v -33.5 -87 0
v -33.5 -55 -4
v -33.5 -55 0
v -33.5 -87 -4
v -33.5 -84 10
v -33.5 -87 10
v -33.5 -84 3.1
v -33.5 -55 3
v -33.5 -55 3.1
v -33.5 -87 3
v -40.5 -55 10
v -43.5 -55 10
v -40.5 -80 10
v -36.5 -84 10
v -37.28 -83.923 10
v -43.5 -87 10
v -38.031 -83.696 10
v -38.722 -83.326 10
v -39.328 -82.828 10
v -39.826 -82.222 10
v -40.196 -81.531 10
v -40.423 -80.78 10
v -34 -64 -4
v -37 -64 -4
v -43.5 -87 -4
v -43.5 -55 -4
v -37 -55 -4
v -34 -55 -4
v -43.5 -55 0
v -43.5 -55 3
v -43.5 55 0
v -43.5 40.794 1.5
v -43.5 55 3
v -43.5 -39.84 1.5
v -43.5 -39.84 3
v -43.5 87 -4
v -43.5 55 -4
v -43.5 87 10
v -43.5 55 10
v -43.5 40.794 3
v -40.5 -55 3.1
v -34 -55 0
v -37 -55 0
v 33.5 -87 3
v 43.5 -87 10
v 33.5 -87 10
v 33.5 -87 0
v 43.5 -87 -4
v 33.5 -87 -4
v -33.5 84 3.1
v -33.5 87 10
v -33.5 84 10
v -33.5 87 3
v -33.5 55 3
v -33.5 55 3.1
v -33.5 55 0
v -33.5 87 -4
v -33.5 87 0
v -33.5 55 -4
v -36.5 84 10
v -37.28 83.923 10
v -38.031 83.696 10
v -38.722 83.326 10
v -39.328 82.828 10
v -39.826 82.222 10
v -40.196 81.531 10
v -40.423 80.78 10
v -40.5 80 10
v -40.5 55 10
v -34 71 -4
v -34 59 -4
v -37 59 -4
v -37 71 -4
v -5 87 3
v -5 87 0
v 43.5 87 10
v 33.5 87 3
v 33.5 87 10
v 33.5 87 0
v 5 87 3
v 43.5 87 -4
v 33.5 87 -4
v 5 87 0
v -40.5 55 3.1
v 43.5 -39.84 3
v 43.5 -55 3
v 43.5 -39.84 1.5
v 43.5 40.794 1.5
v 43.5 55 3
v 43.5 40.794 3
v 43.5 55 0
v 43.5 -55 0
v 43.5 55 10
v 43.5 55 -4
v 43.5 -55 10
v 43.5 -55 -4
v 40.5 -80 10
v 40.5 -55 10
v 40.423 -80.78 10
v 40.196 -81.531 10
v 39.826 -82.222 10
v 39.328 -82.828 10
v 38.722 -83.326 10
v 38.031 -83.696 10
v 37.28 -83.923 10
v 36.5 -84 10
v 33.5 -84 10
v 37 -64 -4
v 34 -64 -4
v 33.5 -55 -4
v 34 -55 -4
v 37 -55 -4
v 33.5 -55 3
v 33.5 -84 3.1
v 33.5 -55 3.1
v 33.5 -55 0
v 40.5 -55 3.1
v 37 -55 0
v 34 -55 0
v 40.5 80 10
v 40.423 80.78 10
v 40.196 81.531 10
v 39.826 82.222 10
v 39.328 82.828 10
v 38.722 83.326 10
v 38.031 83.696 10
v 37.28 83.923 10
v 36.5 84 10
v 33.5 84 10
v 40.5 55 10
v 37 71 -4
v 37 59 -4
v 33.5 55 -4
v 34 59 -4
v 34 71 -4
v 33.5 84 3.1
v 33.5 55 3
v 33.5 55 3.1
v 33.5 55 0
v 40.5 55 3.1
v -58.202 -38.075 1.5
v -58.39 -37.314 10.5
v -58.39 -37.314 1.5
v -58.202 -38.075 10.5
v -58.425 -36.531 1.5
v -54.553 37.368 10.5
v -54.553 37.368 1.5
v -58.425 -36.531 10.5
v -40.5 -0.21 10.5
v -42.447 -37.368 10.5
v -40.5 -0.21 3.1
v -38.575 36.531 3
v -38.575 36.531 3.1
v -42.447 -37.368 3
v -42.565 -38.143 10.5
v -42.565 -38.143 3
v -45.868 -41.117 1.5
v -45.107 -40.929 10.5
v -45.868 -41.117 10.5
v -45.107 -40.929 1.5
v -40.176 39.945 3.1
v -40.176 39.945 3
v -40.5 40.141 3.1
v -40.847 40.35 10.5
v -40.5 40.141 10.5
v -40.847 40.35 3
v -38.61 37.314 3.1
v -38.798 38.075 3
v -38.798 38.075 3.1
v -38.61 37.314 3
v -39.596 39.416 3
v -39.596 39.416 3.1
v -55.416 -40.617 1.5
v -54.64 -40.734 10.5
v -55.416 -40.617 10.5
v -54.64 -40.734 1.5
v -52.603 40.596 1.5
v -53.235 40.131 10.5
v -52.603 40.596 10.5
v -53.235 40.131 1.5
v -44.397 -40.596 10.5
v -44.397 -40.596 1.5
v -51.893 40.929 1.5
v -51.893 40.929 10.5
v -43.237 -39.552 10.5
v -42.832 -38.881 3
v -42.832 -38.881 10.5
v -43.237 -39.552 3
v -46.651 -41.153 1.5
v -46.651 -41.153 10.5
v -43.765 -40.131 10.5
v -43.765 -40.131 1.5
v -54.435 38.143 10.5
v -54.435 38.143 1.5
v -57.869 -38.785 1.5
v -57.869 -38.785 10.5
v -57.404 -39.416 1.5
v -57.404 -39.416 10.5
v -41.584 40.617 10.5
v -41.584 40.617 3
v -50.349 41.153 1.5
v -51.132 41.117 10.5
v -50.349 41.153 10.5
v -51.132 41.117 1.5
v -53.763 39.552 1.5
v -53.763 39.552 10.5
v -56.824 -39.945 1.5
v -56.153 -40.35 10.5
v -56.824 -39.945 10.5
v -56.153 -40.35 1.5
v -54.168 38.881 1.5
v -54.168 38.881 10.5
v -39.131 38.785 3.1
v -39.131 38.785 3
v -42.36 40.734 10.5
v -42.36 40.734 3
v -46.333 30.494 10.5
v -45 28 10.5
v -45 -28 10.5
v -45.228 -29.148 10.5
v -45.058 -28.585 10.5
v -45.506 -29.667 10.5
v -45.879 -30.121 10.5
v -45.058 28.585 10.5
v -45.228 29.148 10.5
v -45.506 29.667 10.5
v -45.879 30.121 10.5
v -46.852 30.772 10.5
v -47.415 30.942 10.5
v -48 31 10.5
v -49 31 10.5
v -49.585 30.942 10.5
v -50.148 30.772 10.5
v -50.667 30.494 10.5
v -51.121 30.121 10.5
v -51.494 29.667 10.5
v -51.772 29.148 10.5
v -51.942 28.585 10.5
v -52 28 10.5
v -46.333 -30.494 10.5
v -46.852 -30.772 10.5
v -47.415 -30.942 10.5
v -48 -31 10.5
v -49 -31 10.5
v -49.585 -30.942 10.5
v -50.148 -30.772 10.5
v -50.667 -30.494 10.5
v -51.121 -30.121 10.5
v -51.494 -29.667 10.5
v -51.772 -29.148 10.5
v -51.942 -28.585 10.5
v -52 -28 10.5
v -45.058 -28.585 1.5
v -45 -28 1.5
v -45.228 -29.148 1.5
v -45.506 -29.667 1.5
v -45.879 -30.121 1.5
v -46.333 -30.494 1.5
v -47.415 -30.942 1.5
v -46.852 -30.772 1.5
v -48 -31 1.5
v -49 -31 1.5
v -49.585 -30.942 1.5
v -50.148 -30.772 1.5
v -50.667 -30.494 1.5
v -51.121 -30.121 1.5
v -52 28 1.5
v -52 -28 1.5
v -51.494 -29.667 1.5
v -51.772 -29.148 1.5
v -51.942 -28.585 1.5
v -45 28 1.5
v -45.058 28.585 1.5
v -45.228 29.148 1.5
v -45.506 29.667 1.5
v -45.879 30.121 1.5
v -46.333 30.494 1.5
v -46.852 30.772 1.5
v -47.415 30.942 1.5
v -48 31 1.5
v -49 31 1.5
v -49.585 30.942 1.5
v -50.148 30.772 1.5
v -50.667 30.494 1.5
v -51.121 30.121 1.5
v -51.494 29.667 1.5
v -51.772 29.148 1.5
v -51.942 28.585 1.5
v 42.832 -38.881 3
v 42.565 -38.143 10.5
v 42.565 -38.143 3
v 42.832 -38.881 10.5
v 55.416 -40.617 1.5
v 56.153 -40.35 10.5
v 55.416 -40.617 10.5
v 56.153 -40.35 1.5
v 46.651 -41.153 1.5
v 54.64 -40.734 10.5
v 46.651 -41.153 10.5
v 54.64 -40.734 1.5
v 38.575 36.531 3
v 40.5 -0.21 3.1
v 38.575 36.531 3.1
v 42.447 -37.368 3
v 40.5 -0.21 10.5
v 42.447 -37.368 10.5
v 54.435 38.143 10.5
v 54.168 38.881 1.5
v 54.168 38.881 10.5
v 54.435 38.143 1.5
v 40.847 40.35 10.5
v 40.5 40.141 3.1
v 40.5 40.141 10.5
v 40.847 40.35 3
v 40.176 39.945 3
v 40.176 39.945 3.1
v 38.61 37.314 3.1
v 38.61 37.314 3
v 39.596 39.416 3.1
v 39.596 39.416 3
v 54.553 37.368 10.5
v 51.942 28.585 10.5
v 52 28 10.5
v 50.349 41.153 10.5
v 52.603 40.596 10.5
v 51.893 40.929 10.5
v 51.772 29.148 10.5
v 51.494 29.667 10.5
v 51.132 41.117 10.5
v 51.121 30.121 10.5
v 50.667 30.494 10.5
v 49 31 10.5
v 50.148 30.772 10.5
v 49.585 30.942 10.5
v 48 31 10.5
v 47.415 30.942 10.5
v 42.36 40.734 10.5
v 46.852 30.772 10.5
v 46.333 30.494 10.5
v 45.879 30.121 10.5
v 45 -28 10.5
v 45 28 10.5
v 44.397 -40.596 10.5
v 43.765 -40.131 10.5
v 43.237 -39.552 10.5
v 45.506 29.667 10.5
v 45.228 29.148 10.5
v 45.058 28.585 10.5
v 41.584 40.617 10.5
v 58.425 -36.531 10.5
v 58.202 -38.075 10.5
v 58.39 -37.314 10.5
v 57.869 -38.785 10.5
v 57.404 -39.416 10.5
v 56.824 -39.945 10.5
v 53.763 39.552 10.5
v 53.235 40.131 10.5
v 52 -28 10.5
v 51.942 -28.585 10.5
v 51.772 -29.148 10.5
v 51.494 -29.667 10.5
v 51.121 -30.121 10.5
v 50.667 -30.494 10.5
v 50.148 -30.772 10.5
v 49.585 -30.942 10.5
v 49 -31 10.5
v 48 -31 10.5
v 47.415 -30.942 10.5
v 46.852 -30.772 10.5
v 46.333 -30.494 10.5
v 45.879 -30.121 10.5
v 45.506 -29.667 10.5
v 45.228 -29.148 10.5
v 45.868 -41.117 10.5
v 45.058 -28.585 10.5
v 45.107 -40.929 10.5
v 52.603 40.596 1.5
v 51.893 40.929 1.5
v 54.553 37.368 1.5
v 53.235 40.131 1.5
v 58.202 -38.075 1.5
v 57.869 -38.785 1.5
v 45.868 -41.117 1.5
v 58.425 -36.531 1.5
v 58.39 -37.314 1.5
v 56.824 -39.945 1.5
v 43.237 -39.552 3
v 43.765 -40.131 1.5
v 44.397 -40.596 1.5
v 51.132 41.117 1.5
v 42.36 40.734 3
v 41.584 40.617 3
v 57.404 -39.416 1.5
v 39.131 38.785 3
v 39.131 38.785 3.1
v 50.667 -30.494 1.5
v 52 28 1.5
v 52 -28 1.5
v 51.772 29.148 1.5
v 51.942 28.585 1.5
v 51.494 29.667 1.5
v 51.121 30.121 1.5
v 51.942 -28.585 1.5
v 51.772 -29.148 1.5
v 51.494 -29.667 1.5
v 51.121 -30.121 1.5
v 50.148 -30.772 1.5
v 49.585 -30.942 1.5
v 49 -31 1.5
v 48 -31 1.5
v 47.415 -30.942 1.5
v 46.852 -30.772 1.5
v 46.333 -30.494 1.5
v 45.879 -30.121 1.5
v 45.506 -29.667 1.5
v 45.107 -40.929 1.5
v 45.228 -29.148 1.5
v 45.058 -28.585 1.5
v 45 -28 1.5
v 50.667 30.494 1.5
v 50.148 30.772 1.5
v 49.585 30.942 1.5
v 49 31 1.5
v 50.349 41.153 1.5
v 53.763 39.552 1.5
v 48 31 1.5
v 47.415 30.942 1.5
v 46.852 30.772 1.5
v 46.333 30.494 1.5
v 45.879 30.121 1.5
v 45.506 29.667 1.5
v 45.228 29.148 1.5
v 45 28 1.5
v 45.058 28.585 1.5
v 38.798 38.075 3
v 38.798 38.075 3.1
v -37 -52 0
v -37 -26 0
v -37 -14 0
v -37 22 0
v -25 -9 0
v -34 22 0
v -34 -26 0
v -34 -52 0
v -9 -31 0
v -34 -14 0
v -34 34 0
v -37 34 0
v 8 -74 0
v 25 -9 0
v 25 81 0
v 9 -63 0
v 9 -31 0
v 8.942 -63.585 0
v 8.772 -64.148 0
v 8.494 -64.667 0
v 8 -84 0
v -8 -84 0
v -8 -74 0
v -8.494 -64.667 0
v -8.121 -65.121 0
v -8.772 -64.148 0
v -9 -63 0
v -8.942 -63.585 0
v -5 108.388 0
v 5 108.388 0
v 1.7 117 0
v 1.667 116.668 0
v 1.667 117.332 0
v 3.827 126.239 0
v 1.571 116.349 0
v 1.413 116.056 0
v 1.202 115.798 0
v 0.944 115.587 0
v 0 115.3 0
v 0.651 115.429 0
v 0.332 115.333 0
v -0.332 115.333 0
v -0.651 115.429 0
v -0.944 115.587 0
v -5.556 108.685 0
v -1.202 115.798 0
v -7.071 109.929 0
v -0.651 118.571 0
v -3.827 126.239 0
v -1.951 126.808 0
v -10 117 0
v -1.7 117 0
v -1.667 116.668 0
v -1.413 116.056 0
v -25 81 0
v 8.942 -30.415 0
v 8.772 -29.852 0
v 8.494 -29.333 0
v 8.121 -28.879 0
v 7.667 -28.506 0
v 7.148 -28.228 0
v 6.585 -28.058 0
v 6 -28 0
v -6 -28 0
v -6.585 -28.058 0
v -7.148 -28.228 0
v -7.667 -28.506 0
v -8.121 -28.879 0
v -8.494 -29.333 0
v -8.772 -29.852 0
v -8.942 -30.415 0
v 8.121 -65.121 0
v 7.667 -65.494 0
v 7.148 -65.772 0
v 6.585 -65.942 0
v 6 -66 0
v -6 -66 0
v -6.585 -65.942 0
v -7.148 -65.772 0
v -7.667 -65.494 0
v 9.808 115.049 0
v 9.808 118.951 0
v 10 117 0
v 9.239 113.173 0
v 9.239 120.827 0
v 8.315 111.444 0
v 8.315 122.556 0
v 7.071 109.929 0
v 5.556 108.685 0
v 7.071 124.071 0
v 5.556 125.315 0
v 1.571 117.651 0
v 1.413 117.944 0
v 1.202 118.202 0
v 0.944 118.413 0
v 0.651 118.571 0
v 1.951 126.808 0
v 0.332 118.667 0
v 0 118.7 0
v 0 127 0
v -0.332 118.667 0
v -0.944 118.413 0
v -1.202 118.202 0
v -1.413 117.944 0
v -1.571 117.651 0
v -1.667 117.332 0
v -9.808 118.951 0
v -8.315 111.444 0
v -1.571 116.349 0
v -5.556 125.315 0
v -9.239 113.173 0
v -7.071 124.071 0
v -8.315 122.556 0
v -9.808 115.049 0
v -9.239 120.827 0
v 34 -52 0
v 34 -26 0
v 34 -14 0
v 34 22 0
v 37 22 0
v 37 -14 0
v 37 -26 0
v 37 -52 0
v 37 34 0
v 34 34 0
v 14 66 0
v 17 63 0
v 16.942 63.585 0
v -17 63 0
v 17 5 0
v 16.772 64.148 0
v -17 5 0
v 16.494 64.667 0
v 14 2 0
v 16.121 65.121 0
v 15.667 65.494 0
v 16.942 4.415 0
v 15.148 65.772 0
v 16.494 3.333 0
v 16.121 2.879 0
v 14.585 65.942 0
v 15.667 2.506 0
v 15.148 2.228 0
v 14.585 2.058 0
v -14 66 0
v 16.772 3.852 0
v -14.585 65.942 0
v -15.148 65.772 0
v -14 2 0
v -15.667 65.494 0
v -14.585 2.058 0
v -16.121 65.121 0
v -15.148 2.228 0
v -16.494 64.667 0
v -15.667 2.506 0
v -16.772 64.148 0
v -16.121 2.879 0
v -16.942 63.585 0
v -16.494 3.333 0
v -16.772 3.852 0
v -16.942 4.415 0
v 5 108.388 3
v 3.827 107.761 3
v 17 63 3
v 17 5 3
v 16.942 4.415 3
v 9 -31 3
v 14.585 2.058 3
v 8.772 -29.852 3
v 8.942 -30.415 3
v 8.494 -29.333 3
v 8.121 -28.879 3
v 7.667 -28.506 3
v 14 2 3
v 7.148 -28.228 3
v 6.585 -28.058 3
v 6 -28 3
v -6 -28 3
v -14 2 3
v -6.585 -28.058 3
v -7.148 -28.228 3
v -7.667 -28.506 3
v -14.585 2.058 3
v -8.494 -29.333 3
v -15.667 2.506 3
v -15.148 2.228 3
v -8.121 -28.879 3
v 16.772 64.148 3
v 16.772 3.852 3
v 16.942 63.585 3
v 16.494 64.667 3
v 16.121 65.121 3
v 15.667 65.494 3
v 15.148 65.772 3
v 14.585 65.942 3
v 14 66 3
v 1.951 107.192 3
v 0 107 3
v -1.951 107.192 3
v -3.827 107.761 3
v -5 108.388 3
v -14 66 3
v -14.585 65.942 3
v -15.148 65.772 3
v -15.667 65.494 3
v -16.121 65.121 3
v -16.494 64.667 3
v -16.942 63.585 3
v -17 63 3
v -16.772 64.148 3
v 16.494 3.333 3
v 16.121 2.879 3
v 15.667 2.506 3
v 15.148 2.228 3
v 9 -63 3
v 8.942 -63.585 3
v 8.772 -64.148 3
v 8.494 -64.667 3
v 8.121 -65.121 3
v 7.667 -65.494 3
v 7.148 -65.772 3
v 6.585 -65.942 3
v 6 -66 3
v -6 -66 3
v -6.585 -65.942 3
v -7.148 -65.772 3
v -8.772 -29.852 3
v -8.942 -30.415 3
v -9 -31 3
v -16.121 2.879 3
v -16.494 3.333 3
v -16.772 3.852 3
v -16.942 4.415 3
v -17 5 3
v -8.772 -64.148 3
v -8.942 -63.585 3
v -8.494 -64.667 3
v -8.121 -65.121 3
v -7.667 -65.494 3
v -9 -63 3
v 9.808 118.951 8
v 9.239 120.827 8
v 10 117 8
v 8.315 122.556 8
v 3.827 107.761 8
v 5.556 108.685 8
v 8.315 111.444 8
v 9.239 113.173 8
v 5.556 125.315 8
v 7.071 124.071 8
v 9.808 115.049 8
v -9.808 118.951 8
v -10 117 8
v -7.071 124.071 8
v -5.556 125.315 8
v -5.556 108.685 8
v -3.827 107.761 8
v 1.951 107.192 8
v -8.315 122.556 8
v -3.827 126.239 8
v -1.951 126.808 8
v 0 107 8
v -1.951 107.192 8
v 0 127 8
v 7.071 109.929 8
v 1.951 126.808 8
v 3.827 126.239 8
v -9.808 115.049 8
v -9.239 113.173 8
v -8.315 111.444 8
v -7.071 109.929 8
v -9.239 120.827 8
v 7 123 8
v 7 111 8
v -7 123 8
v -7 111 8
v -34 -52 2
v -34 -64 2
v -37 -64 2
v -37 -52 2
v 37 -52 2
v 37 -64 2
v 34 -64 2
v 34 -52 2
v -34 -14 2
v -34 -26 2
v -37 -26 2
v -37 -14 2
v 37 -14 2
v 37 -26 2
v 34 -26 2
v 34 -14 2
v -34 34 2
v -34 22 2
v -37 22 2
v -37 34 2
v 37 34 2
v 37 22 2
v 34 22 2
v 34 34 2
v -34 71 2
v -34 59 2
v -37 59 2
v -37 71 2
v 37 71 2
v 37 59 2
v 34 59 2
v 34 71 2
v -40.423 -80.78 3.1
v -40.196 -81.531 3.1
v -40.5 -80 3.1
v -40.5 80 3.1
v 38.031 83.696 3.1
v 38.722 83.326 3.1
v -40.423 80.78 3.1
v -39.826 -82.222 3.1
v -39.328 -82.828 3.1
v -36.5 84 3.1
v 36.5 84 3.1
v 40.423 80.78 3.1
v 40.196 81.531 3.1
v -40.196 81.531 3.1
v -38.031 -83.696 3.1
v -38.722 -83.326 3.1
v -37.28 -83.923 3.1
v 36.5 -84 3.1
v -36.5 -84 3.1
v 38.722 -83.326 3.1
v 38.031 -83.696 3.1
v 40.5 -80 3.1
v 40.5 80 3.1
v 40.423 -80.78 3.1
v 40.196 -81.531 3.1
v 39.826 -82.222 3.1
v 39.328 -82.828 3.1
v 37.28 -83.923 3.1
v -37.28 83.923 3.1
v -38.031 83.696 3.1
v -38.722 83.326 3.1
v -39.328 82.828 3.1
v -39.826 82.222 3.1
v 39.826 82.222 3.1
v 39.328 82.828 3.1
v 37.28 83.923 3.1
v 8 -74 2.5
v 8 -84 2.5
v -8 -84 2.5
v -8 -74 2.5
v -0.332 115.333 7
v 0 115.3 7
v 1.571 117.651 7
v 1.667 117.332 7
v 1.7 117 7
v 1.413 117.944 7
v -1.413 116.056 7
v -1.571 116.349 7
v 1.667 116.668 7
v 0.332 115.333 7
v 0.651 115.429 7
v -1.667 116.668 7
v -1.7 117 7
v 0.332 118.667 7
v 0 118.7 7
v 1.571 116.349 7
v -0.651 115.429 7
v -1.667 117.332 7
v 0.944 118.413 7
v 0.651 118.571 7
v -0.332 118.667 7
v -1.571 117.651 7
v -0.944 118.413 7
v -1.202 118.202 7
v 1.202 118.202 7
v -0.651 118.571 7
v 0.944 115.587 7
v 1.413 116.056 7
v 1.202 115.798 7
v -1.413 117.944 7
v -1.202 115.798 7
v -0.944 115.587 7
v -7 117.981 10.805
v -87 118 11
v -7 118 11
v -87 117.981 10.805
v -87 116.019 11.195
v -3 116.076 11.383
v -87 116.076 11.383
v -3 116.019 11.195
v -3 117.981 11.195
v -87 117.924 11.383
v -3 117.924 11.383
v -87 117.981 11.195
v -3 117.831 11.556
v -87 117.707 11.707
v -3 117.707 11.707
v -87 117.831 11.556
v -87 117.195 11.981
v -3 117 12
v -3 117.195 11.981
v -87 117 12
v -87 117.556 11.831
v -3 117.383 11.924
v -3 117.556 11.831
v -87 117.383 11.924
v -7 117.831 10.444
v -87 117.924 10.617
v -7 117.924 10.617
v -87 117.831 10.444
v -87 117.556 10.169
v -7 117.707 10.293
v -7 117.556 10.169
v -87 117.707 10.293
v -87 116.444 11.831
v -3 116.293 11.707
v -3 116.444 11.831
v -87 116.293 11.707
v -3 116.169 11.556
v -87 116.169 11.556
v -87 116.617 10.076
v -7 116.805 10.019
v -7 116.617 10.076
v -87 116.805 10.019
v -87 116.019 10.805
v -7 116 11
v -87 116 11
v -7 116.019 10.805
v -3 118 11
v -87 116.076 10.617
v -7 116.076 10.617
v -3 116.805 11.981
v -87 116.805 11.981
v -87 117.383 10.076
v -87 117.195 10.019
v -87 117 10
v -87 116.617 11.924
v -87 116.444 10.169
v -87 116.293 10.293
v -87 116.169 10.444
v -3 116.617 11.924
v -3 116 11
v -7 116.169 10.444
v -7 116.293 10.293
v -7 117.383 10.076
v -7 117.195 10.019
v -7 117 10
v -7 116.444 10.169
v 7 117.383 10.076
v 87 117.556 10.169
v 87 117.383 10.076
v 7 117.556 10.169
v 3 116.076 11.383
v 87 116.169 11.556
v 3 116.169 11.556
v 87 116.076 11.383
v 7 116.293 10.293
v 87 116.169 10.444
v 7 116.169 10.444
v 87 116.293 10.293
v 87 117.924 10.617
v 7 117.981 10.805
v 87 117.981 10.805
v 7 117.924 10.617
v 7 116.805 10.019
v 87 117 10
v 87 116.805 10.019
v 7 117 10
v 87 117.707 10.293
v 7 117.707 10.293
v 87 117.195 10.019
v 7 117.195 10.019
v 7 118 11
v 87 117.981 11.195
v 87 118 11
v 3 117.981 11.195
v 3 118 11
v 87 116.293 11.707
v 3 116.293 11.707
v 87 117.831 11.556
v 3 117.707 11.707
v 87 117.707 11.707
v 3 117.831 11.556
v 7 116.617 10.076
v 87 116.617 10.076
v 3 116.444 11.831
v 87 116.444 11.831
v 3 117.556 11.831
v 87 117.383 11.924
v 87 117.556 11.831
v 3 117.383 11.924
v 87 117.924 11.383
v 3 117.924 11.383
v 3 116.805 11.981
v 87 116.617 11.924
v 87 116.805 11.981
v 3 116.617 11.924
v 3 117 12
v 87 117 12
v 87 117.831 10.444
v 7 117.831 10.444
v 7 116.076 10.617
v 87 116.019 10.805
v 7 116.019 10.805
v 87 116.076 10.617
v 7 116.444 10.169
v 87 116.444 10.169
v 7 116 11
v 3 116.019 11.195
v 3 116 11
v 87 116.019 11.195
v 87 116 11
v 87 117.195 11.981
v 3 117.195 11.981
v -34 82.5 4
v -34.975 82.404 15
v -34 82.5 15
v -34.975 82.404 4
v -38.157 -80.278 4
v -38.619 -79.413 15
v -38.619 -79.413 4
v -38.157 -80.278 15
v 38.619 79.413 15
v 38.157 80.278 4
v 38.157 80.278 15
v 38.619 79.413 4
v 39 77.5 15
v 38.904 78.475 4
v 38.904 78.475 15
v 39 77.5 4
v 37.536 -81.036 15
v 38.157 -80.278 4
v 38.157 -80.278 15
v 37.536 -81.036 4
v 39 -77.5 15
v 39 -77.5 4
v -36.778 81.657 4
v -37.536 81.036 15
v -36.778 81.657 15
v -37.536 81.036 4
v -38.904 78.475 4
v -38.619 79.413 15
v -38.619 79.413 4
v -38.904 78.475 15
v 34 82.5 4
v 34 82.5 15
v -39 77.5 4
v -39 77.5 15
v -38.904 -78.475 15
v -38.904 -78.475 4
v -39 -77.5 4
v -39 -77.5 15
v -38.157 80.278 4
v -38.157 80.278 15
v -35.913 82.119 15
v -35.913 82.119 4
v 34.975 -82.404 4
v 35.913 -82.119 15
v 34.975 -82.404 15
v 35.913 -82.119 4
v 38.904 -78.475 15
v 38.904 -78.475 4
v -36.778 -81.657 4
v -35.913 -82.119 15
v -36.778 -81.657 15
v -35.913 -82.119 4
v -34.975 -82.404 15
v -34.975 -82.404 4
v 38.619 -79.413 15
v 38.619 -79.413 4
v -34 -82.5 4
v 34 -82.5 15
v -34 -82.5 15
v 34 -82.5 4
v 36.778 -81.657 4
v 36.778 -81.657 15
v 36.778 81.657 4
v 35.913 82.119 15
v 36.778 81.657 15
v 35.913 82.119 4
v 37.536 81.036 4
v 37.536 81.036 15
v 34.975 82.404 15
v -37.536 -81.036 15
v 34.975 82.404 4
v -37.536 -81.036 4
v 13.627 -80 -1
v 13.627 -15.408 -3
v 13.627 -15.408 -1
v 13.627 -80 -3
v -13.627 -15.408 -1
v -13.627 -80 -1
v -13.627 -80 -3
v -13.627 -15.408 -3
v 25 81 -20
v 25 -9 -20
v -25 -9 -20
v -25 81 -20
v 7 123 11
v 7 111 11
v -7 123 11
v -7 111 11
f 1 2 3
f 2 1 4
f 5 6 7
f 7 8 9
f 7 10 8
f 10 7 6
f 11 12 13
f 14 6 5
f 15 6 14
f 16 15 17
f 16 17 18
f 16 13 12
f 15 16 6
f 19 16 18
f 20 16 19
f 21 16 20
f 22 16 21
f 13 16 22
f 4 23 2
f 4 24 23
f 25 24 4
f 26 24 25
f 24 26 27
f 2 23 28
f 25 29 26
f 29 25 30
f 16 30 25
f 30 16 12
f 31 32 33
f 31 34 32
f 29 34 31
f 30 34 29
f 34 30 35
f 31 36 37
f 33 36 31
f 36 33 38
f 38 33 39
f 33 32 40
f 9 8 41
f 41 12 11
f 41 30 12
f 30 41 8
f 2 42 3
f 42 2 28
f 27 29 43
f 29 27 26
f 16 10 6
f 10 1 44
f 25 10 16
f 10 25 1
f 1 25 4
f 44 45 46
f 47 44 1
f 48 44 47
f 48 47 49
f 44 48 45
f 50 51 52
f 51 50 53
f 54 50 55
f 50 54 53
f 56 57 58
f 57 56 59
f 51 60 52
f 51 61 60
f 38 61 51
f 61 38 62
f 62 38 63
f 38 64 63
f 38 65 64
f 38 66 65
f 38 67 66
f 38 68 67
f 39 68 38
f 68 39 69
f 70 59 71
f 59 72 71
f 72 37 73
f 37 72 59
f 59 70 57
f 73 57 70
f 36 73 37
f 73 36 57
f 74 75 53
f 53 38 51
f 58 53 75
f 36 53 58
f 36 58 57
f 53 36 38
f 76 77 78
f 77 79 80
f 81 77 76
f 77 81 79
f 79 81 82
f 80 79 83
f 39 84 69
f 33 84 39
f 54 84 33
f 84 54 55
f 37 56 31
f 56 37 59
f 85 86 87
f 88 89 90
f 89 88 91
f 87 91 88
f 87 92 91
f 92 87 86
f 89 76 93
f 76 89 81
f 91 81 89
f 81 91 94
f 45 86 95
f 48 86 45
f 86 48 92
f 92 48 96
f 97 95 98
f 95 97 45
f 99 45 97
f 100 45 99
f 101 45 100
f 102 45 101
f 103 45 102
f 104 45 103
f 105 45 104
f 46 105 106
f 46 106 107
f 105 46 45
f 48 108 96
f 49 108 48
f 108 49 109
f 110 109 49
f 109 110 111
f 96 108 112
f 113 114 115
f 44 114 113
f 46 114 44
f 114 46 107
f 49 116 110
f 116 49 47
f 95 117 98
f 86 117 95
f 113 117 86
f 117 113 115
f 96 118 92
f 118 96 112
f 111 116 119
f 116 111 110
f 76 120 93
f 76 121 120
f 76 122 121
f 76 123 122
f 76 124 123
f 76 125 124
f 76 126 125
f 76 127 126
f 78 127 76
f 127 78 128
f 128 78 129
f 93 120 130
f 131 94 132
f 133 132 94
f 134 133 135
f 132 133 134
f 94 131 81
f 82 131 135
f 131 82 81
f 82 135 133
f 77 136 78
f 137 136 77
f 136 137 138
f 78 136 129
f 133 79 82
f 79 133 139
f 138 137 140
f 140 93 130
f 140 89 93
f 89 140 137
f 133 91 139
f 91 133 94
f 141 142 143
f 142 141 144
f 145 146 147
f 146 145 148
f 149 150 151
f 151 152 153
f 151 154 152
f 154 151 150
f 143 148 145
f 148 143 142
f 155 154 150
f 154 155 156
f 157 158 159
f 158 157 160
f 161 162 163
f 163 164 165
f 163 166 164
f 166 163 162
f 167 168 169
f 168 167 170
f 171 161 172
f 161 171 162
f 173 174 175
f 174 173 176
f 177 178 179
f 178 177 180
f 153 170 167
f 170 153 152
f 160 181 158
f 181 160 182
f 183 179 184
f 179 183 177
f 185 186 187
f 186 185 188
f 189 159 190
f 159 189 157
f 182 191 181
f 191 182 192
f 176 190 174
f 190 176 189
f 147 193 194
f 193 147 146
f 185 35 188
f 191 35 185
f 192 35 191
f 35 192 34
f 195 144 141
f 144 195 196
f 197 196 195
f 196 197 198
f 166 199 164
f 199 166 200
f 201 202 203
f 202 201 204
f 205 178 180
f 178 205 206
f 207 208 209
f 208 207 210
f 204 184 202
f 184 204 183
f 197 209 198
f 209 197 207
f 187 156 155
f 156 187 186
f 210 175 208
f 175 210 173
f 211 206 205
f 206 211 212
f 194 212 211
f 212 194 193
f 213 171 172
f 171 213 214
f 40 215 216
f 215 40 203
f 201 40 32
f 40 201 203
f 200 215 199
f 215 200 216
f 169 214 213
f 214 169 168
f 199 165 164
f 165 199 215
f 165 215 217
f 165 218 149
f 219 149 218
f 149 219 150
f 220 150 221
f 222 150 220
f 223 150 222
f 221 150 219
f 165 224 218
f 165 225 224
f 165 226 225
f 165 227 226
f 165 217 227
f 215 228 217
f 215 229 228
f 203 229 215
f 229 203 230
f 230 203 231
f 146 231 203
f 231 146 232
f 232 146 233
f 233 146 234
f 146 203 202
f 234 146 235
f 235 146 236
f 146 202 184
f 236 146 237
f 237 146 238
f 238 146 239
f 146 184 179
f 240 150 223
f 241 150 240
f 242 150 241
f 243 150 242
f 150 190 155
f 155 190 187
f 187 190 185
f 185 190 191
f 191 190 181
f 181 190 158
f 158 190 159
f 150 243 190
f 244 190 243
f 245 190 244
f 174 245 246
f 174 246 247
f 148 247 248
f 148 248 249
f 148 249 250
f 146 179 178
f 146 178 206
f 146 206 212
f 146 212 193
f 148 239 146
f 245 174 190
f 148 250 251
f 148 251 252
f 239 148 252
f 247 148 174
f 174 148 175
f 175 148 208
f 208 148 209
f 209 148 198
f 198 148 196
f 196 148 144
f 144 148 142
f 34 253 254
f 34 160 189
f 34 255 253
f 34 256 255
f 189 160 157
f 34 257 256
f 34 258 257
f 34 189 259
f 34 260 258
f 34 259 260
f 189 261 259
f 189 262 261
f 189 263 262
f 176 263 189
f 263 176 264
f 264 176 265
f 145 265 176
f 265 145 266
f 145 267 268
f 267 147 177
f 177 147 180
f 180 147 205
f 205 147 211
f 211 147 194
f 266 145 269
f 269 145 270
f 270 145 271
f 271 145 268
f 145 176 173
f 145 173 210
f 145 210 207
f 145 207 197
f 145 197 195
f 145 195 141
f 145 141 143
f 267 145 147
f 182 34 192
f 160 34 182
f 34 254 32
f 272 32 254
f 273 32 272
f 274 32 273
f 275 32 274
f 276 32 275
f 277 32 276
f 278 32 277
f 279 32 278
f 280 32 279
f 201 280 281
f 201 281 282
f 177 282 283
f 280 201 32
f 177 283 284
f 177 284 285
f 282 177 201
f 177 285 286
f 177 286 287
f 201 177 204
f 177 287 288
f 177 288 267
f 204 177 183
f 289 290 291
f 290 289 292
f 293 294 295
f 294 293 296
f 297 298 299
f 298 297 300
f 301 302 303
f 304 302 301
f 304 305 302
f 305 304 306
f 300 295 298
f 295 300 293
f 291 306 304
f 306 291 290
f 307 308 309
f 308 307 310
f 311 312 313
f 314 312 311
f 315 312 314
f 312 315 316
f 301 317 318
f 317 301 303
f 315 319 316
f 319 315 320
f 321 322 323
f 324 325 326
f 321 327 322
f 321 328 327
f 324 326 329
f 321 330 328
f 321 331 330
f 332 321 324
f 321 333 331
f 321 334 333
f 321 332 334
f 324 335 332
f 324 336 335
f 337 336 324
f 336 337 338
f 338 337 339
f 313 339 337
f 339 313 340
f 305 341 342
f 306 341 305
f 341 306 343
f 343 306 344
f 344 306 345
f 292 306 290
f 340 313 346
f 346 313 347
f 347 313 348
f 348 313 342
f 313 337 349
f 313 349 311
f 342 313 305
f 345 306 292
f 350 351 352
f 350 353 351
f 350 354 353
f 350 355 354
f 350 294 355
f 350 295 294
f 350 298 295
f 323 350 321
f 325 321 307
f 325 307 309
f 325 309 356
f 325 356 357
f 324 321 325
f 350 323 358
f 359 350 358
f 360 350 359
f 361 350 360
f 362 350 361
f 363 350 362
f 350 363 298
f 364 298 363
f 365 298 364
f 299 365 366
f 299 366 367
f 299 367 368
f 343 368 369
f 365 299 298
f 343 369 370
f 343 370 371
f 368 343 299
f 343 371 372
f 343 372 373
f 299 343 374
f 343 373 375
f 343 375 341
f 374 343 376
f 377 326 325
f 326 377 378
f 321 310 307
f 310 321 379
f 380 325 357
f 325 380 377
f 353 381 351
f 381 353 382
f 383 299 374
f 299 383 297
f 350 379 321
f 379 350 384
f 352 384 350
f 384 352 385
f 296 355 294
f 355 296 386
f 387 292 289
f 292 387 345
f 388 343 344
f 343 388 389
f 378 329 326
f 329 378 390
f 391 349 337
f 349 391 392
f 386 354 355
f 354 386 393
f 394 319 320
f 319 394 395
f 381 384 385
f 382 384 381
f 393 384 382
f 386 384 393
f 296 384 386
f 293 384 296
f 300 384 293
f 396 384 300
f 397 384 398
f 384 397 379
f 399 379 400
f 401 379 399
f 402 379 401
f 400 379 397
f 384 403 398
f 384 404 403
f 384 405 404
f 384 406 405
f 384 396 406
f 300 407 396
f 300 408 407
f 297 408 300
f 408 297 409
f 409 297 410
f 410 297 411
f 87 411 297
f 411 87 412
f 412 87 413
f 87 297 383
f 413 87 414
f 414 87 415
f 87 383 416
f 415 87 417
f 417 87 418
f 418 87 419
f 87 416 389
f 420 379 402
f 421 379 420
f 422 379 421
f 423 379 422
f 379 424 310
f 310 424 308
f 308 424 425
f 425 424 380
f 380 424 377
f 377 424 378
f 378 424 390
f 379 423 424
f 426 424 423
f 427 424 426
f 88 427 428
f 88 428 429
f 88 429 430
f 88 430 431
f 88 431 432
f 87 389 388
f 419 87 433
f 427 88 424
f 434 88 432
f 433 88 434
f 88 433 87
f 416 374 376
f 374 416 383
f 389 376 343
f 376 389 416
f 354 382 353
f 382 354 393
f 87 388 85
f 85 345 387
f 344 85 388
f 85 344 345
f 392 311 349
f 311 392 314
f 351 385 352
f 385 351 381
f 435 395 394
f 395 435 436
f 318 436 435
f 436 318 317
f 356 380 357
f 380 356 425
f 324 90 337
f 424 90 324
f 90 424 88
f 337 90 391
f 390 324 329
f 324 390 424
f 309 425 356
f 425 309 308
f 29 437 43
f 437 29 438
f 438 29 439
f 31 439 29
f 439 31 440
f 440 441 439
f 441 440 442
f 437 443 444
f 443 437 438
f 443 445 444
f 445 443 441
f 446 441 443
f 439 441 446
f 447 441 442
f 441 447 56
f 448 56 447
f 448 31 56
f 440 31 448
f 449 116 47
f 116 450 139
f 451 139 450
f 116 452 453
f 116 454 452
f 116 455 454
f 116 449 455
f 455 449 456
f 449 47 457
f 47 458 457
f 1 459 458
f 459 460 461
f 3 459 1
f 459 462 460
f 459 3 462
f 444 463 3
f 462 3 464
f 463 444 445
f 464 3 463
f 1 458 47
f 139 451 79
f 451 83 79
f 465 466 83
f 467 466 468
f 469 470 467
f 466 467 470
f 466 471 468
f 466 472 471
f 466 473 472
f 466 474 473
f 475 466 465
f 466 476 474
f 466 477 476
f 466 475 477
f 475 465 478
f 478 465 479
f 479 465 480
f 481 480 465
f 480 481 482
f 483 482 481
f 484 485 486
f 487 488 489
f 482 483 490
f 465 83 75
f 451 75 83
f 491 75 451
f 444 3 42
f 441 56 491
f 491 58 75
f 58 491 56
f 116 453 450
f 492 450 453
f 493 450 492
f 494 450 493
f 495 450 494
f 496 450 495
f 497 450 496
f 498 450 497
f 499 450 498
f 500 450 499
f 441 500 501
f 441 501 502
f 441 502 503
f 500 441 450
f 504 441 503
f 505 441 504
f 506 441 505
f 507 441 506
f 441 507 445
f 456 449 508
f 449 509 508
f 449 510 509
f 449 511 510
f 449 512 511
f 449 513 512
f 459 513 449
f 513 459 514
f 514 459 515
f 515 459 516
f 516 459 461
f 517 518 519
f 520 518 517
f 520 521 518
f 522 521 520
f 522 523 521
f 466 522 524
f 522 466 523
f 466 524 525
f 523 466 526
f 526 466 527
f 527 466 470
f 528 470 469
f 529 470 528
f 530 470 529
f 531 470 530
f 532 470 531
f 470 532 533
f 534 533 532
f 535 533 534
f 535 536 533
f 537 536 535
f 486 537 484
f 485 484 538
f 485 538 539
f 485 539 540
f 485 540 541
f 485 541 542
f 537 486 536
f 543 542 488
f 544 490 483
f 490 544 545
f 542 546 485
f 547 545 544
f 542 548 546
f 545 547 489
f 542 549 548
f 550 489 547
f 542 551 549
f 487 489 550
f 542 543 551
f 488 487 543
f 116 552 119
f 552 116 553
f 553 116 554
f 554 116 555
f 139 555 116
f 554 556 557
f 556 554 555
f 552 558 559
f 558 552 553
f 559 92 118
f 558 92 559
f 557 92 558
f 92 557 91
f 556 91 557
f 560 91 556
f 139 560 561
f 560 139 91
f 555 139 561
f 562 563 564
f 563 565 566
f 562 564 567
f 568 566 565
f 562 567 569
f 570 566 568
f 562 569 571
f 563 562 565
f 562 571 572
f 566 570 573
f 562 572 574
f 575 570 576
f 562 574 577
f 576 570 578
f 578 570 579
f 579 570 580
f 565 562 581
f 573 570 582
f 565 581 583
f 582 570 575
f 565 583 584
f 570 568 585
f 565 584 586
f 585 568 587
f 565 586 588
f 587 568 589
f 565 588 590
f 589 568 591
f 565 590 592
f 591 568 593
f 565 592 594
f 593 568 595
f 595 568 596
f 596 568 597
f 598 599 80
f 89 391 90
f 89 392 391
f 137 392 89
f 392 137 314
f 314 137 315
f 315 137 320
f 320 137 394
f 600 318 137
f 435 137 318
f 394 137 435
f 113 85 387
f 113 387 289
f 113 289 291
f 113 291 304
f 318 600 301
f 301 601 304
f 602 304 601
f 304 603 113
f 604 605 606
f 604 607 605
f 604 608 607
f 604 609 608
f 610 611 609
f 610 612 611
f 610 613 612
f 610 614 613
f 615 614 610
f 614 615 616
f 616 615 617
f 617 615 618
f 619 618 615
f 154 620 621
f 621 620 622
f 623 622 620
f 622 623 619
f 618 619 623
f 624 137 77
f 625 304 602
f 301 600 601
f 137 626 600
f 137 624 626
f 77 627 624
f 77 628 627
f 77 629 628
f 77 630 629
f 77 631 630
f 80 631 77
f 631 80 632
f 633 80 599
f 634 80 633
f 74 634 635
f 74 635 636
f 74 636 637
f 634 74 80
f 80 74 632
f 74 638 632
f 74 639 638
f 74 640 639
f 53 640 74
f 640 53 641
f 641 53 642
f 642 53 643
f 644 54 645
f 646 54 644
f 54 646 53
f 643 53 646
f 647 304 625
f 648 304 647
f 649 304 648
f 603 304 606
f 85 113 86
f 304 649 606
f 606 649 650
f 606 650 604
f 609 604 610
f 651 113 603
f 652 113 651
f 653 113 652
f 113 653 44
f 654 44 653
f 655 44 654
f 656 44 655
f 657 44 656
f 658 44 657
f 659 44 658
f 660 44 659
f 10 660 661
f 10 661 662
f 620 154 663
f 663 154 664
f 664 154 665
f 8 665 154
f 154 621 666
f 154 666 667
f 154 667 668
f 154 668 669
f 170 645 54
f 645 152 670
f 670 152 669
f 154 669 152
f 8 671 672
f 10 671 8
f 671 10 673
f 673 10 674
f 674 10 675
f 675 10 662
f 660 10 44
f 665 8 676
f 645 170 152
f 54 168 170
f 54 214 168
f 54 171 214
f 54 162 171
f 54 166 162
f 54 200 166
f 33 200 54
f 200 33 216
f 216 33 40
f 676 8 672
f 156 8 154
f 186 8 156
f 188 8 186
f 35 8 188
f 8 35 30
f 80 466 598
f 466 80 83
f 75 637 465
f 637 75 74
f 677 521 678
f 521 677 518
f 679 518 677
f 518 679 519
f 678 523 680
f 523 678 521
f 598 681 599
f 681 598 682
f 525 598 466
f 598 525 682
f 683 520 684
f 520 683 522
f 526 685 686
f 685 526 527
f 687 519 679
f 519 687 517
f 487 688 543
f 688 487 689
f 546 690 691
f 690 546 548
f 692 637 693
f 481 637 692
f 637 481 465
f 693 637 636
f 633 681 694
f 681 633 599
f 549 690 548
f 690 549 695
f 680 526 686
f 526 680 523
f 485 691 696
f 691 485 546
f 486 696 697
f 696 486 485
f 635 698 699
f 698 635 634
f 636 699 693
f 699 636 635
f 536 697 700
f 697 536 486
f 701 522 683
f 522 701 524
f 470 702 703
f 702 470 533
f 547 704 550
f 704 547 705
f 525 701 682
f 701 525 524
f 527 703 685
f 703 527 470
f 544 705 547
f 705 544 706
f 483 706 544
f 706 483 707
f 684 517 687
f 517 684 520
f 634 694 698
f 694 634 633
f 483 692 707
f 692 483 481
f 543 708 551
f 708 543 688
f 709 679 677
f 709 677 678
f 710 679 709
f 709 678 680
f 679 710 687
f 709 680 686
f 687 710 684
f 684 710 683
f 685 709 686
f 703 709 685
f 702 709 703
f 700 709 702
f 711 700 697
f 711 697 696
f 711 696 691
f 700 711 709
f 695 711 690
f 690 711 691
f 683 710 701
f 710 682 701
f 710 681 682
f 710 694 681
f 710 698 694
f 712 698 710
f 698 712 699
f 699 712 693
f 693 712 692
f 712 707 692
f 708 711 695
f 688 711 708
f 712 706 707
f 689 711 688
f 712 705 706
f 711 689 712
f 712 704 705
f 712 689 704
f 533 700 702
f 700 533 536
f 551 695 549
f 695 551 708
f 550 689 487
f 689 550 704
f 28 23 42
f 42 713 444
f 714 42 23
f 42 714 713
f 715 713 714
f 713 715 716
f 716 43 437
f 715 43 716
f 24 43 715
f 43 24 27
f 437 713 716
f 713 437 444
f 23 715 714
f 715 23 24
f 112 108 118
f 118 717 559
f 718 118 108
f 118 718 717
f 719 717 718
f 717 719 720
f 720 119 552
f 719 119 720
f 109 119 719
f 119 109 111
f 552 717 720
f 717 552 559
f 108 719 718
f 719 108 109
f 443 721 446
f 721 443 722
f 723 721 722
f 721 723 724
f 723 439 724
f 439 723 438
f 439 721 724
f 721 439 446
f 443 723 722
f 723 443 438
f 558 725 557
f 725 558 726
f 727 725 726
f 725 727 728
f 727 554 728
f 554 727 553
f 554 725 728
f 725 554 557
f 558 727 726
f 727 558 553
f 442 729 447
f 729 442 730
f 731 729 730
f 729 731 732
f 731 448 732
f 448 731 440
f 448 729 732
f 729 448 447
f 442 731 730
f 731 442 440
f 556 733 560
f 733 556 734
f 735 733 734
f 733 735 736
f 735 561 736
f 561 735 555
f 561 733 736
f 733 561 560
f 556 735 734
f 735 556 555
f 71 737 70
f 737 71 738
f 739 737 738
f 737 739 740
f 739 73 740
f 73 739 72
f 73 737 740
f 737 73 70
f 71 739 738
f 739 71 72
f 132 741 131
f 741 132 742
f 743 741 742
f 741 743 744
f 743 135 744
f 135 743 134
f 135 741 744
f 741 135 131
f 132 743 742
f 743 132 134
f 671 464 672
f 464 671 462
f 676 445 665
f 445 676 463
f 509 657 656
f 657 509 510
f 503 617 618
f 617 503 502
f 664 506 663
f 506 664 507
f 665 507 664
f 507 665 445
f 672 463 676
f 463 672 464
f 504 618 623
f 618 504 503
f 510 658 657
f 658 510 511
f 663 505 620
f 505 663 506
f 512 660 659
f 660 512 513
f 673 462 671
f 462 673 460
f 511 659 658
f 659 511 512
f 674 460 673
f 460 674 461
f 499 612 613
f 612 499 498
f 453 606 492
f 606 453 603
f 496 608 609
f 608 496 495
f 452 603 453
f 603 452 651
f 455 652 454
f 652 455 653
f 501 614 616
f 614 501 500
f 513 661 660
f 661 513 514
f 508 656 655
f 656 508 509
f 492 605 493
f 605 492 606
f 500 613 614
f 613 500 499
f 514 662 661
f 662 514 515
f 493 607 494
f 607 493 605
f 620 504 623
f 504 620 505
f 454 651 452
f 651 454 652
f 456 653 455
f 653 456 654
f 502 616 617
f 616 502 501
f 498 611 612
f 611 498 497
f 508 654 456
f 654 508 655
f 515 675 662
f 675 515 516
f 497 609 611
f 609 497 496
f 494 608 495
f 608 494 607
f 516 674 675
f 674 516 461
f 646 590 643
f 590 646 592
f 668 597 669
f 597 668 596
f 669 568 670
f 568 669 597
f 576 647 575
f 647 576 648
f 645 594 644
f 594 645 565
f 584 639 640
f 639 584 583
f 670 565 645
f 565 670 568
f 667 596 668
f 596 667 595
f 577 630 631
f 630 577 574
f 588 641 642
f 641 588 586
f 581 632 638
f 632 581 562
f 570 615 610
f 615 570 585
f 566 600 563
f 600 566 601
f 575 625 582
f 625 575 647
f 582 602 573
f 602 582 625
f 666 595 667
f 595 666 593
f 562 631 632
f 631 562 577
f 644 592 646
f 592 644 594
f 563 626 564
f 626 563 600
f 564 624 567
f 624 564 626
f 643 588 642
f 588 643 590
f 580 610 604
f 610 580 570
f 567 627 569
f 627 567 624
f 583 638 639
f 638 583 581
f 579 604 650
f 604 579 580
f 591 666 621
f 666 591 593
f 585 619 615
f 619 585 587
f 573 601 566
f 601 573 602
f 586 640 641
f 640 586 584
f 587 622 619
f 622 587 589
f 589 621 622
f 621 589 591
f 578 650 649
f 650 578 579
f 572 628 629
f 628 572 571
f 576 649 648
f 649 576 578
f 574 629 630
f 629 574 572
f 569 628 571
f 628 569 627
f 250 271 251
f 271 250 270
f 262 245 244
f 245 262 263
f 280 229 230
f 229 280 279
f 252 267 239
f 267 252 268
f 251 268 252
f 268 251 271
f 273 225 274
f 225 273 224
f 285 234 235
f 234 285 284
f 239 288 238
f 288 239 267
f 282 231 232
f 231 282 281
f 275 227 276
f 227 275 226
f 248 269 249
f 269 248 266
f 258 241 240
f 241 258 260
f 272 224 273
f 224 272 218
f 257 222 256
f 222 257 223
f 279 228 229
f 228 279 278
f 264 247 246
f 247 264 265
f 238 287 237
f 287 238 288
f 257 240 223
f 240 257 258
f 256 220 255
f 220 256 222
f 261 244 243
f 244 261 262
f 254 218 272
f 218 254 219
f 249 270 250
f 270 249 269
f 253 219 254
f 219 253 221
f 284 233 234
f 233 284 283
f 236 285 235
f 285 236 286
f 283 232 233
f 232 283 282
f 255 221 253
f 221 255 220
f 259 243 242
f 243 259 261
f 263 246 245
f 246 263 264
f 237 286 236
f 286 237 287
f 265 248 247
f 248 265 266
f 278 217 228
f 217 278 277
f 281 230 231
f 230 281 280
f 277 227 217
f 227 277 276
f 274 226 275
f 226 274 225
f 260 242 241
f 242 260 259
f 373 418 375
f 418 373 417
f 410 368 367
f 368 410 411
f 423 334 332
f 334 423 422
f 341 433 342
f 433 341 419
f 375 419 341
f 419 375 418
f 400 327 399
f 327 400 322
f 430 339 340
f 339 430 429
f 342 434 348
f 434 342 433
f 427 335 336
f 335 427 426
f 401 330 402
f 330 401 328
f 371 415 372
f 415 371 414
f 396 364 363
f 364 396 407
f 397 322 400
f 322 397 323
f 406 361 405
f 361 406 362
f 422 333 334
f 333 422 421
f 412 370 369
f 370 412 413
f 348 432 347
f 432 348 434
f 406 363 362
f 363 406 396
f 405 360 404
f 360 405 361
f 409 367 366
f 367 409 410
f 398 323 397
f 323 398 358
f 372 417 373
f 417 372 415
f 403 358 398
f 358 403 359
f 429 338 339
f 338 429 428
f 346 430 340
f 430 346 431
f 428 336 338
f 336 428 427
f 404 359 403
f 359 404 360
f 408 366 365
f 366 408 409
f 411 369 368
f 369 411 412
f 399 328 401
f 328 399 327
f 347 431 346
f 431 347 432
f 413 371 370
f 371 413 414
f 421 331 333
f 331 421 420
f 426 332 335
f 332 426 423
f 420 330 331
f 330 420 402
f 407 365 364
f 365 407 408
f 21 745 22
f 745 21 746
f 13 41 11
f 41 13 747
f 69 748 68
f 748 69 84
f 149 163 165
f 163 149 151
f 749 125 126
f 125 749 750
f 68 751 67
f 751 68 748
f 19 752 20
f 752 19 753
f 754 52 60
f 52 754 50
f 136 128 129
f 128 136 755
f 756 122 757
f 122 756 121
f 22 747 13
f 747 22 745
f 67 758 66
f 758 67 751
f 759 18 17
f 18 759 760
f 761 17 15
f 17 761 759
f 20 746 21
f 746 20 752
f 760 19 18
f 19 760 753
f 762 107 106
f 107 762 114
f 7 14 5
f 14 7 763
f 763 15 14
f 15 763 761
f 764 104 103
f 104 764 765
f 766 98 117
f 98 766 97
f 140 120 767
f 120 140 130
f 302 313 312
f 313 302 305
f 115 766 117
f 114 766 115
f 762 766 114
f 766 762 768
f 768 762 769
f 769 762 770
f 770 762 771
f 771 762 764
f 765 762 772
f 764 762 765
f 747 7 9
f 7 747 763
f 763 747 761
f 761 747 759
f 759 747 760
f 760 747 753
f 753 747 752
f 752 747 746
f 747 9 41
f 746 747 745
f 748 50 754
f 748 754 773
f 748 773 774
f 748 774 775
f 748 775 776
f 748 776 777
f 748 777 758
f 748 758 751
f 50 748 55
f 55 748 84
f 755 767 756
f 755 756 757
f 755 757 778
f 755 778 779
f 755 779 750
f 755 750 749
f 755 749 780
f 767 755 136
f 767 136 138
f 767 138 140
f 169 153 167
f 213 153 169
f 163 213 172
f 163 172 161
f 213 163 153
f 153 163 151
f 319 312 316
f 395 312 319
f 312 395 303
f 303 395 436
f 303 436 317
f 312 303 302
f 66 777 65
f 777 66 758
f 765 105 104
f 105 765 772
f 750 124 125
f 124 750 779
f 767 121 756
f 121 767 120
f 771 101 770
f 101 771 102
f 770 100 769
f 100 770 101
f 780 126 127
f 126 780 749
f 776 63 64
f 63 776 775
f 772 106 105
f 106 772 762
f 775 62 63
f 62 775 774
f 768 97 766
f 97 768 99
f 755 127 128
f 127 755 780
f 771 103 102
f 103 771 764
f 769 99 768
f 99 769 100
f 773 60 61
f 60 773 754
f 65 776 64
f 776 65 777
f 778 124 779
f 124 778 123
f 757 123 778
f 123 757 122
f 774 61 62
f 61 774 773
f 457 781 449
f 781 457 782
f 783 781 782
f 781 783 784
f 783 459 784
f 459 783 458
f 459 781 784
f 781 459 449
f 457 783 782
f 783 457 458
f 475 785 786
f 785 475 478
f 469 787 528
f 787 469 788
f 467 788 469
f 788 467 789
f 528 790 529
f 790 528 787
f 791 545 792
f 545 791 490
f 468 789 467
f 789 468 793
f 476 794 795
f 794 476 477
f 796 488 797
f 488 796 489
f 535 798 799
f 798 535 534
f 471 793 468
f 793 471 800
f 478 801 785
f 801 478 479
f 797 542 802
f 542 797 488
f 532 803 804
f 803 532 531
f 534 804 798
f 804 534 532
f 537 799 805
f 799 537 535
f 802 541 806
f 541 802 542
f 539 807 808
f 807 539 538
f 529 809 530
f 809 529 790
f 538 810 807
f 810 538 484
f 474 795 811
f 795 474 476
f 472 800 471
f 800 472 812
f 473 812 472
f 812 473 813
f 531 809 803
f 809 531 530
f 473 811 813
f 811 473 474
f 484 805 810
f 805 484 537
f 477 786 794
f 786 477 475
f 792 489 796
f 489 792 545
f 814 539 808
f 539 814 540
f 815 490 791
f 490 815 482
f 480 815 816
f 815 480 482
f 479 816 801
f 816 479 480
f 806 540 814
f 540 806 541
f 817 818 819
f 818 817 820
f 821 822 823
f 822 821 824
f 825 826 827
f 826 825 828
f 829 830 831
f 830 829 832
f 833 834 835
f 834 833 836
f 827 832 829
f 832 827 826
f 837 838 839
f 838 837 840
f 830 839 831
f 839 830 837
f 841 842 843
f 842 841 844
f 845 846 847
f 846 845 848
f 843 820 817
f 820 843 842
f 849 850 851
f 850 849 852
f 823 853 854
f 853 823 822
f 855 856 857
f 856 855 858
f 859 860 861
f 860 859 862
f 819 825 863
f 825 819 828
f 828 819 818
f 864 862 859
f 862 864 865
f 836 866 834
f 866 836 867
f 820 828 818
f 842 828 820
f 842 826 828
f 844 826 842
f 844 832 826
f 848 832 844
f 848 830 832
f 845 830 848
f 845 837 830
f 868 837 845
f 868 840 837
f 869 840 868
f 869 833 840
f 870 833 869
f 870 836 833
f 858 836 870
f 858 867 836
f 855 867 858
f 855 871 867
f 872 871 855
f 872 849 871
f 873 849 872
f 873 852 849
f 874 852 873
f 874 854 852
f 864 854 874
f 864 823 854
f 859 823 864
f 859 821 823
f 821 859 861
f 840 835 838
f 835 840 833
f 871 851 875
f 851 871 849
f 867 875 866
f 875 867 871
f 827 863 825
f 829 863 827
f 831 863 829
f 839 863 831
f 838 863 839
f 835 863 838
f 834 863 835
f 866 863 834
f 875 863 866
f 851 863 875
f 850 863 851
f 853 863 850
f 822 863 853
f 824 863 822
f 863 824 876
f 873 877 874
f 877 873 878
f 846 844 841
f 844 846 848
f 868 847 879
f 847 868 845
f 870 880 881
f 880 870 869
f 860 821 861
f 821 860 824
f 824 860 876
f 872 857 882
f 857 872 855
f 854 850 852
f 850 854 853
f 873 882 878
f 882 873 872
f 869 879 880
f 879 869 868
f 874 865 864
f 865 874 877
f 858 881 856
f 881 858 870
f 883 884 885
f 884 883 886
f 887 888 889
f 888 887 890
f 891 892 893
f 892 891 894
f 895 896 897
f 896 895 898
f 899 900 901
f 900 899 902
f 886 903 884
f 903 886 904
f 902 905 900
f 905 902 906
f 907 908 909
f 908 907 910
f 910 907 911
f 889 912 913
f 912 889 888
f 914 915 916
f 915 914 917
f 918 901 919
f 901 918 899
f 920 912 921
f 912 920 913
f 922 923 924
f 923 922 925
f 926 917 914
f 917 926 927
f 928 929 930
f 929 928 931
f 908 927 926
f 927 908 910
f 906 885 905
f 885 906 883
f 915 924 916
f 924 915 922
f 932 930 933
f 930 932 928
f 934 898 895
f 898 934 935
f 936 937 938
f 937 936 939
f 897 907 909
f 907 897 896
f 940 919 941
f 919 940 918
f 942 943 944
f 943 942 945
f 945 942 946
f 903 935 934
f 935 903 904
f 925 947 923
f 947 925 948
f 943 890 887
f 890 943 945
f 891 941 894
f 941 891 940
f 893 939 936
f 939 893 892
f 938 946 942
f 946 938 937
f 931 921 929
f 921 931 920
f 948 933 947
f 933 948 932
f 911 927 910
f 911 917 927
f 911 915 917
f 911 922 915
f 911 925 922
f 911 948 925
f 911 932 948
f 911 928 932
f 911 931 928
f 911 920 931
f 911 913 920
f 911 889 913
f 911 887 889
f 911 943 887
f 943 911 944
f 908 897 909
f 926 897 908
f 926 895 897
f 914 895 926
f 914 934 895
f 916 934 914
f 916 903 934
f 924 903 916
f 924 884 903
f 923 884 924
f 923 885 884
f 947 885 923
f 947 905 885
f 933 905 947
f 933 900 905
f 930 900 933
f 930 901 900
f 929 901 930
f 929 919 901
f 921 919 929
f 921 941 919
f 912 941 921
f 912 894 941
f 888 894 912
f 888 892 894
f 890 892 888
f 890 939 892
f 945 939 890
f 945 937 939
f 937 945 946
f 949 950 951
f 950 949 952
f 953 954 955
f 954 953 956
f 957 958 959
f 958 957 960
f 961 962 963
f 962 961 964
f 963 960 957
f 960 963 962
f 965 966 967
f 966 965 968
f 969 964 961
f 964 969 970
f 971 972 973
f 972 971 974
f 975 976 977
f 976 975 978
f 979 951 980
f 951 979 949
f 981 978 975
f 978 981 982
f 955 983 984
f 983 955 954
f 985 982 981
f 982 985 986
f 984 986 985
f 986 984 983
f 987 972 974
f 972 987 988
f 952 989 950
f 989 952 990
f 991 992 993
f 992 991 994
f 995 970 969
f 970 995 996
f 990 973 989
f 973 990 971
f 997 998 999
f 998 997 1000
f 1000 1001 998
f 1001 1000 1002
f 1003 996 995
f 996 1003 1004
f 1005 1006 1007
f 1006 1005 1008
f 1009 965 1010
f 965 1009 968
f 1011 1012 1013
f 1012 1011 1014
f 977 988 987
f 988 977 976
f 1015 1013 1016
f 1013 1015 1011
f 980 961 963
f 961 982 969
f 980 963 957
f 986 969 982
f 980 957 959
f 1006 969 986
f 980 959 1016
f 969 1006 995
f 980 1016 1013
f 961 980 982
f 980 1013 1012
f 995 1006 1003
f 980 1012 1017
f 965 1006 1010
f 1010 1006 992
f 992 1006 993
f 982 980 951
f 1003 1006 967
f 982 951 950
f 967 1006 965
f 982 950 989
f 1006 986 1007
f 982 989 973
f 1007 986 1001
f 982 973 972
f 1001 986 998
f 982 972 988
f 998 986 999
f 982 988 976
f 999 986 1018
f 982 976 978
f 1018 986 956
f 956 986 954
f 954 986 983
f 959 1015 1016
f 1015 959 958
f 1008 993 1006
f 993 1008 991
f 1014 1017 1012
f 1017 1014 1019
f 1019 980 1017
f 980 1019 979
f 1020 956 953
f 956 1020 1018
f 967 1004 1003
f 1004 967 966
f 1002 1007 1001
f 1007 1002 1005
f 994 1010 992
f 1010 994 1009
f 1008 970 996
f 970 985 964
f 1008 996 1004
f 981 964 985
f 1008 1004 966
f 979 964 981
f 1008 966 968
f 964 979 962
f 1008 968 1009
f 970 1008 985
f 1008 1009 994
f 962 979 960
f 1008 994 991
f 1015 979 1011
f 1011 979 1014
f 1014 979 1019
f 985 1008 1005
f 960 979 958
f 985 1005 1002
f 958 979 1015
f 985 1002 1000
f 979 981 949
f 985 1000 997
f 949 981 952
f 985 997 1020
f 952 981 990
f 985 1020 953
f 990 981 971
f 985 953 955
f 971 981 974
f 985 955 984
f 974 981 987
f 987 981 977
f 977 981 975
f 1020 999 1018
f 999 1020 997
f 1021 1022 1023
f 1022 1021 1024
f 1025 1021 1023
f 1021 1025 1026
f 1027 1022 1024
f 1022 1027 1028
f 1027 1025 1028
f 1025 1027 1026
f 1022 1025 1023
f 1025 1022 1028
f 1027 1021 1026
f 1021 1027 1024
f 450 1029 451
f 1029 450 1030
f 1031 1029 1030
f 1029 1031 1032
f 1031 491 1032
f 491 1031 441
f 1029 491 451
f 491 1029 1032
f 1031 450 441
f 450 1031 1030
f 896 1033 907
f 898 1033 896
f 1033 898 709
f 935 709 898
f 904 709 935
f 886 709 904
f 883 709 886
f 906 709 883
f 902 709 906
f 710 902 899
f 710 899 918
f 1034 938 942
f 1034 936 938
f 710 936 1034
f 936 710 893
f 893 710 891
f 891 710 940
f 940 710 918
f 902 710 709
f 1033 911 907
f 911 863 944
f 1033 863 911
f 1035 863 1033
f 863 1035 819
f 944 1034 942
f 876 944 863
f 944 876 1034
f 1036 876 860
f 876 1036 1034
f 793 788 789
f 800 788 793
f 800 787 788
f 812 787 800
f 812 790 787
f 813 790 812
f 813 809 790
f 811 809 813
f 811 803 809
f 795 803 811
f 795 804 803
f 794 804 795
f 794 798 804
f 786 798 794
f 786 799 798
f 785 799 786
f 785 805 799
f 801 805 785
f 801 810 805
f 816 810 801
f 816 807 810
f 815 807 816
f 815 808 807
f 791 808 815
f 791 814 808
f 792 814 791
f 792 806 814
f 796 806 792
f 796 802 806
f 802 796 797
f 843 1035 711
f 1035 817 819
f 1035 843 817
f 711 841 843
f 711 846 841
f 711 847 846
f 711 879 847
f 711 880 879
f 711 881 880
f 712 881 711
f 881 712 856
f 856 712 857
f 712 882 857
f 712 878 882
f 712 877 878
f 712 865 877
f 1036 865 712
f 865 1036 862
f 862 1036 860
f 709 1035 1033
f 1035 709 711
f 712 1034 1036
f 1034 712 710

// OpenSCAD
// AMID radio dock 0.1 — parametric carrier study, millimetres.
// The default phone/powerbank are envelopes, not verified product dimensions.
// Printable carrier: openscad -D show_mockups=false -o carrier.stl phone_carrier.scad
// Fold study: openscad -D antenna_folded=true ...
$fn = 32;
phone_w = 78;
phone_h = 165;
phone_t = 11;
fit_clearance = 1.5;
wall = 3;
board_w = 27.2542;
board_h = 64.5922;
board_clearance = 2;
powerbank_w = 50;
powerbank_h = 90;
powerbank_t = 20;
rod_length = 84;
feed_gap = 6;
antenna_offset = 30;
antenna_folded = false;
show_mockups = true;

inner_w = phone_w + fit_clearance * 2;
inner_h = phone_h + fit_clearance * 2;
outer_w = inner_w + wall * 2;
outer_h = inner_h + wall * 2;

assert(phone_w >= 60 && phone_h >= 140 && phone_t > 0);
assert(board_w + board_clearance * 2 < inner_w);
assert(powerbank_w + 4 < inner_w);
assert(board_h + powerbank_h + 6 < inner_h);

module slab(w,h,t,r=5) {
  linear_extrude(t) hull() for (x=[-w/2+r,w/2-r], y=[-h/2+r,h/2-r])
    translate([x,y]) circle(r=r);
}
module carrier() {
  difference() {
    union() {
      slab(outer_w,outer_h,wall);
      // Four corner retainers; the centre of each phone edge stays accessible.
      for (sx=[-1,1],sy=[-1,1]) translate([sx*(outer_w/2-5),sy*(outer_h/2-16),wall])
        cube([10,32,phone_t+3],center=true);
      // Side grips join the plate; facets are deliberate, not RF elements.
      for (sx=[-1,1]) translate([sx*(outer_w/2+5),0,wall/2])
        rotate([0,0,sx*3]) slab(16,82,wall+6,4);
      // Dielectric antenna support extends clear of the phone envelope.
      translate([-5,outer_h/2-5,0]) cube([10,antenna_offset+10,wall]);
      translate([0,outer_h/2+antenna_offset,0]) cylinder(h=wall+5,r=10);
    }
    // Phone insertion pocket; retainers intentionally do not clamp glass.
    translate([0,0,wall+.1]) slab(inner_w,inner_h,phone_t+14,4);
    // Retention straps, separate from PCB traces / mounting-hole assumptions.
    for (y=[-58,-20,28,65],x=[-inner_w/2+5,inner_w/2-5])
      translate([x,y,-1]) cube([3,12,wall+3],center=true);
    // Open-back windows and hollow grips reduce printed mass and retain air gaps.
    for (p=[[0,-47,18,38],[0,34,34,64]]) translate([p[0],p[1],-8]) slab(p[2],p[3],wall+18,3);
    for (sx=[-1,1]) translate([sx*(outer_w/2+5),0,-8]) slab(7,62,wall+24,3);
    // Cable/antenna holes are generous pass-throughs, not connector fixtures.
    translate([0,-outer_h/2+8,-1]) cube([16,10,wall+4],center=true);
    translate([0,outer_h/2+antenna_offset,-1]) cylinder(h=wall+10,d=3.4);
  }
}
module rod(side) {
  angle = antenna_folded ? (side < 0 ? 90 : -90) : 0;
  translate([side*feed_gap/2,outer_h/2+antenna_offset,wall+8]) rotate([0,0,angle])
    rotate([0,side*90,0]) cylinder(h=rod_length,d=2);
}
color([.11,.14,.16]) carrier();
if (show_mockups) {
  // Previews only: excluded from printable carrier export.
  color([.12,.32,.40,.55]) translate([0,0,wall+1]) slab(phone_w,phone_h,phone_t,5);
  color([.0,.55,.43]) translate([-board_w/2,-inner_h/2+4,-3]) cube([board_w,board_h,2]);
  color([.26,.27,.29]) translate([-powerbank_w/2,inner_h/2-powerbank_h-3,-powerbank_t]) cube([powerbank_w,powerbank_h,powerbank_t]);
  color([.96,.50,.17]) { rod(-1); rod(1); }
  color([.05,.75,.64]) translate([-7,outer_h/2+antenna_offset-6,wall+4]) cube([14,12,4]);
}
